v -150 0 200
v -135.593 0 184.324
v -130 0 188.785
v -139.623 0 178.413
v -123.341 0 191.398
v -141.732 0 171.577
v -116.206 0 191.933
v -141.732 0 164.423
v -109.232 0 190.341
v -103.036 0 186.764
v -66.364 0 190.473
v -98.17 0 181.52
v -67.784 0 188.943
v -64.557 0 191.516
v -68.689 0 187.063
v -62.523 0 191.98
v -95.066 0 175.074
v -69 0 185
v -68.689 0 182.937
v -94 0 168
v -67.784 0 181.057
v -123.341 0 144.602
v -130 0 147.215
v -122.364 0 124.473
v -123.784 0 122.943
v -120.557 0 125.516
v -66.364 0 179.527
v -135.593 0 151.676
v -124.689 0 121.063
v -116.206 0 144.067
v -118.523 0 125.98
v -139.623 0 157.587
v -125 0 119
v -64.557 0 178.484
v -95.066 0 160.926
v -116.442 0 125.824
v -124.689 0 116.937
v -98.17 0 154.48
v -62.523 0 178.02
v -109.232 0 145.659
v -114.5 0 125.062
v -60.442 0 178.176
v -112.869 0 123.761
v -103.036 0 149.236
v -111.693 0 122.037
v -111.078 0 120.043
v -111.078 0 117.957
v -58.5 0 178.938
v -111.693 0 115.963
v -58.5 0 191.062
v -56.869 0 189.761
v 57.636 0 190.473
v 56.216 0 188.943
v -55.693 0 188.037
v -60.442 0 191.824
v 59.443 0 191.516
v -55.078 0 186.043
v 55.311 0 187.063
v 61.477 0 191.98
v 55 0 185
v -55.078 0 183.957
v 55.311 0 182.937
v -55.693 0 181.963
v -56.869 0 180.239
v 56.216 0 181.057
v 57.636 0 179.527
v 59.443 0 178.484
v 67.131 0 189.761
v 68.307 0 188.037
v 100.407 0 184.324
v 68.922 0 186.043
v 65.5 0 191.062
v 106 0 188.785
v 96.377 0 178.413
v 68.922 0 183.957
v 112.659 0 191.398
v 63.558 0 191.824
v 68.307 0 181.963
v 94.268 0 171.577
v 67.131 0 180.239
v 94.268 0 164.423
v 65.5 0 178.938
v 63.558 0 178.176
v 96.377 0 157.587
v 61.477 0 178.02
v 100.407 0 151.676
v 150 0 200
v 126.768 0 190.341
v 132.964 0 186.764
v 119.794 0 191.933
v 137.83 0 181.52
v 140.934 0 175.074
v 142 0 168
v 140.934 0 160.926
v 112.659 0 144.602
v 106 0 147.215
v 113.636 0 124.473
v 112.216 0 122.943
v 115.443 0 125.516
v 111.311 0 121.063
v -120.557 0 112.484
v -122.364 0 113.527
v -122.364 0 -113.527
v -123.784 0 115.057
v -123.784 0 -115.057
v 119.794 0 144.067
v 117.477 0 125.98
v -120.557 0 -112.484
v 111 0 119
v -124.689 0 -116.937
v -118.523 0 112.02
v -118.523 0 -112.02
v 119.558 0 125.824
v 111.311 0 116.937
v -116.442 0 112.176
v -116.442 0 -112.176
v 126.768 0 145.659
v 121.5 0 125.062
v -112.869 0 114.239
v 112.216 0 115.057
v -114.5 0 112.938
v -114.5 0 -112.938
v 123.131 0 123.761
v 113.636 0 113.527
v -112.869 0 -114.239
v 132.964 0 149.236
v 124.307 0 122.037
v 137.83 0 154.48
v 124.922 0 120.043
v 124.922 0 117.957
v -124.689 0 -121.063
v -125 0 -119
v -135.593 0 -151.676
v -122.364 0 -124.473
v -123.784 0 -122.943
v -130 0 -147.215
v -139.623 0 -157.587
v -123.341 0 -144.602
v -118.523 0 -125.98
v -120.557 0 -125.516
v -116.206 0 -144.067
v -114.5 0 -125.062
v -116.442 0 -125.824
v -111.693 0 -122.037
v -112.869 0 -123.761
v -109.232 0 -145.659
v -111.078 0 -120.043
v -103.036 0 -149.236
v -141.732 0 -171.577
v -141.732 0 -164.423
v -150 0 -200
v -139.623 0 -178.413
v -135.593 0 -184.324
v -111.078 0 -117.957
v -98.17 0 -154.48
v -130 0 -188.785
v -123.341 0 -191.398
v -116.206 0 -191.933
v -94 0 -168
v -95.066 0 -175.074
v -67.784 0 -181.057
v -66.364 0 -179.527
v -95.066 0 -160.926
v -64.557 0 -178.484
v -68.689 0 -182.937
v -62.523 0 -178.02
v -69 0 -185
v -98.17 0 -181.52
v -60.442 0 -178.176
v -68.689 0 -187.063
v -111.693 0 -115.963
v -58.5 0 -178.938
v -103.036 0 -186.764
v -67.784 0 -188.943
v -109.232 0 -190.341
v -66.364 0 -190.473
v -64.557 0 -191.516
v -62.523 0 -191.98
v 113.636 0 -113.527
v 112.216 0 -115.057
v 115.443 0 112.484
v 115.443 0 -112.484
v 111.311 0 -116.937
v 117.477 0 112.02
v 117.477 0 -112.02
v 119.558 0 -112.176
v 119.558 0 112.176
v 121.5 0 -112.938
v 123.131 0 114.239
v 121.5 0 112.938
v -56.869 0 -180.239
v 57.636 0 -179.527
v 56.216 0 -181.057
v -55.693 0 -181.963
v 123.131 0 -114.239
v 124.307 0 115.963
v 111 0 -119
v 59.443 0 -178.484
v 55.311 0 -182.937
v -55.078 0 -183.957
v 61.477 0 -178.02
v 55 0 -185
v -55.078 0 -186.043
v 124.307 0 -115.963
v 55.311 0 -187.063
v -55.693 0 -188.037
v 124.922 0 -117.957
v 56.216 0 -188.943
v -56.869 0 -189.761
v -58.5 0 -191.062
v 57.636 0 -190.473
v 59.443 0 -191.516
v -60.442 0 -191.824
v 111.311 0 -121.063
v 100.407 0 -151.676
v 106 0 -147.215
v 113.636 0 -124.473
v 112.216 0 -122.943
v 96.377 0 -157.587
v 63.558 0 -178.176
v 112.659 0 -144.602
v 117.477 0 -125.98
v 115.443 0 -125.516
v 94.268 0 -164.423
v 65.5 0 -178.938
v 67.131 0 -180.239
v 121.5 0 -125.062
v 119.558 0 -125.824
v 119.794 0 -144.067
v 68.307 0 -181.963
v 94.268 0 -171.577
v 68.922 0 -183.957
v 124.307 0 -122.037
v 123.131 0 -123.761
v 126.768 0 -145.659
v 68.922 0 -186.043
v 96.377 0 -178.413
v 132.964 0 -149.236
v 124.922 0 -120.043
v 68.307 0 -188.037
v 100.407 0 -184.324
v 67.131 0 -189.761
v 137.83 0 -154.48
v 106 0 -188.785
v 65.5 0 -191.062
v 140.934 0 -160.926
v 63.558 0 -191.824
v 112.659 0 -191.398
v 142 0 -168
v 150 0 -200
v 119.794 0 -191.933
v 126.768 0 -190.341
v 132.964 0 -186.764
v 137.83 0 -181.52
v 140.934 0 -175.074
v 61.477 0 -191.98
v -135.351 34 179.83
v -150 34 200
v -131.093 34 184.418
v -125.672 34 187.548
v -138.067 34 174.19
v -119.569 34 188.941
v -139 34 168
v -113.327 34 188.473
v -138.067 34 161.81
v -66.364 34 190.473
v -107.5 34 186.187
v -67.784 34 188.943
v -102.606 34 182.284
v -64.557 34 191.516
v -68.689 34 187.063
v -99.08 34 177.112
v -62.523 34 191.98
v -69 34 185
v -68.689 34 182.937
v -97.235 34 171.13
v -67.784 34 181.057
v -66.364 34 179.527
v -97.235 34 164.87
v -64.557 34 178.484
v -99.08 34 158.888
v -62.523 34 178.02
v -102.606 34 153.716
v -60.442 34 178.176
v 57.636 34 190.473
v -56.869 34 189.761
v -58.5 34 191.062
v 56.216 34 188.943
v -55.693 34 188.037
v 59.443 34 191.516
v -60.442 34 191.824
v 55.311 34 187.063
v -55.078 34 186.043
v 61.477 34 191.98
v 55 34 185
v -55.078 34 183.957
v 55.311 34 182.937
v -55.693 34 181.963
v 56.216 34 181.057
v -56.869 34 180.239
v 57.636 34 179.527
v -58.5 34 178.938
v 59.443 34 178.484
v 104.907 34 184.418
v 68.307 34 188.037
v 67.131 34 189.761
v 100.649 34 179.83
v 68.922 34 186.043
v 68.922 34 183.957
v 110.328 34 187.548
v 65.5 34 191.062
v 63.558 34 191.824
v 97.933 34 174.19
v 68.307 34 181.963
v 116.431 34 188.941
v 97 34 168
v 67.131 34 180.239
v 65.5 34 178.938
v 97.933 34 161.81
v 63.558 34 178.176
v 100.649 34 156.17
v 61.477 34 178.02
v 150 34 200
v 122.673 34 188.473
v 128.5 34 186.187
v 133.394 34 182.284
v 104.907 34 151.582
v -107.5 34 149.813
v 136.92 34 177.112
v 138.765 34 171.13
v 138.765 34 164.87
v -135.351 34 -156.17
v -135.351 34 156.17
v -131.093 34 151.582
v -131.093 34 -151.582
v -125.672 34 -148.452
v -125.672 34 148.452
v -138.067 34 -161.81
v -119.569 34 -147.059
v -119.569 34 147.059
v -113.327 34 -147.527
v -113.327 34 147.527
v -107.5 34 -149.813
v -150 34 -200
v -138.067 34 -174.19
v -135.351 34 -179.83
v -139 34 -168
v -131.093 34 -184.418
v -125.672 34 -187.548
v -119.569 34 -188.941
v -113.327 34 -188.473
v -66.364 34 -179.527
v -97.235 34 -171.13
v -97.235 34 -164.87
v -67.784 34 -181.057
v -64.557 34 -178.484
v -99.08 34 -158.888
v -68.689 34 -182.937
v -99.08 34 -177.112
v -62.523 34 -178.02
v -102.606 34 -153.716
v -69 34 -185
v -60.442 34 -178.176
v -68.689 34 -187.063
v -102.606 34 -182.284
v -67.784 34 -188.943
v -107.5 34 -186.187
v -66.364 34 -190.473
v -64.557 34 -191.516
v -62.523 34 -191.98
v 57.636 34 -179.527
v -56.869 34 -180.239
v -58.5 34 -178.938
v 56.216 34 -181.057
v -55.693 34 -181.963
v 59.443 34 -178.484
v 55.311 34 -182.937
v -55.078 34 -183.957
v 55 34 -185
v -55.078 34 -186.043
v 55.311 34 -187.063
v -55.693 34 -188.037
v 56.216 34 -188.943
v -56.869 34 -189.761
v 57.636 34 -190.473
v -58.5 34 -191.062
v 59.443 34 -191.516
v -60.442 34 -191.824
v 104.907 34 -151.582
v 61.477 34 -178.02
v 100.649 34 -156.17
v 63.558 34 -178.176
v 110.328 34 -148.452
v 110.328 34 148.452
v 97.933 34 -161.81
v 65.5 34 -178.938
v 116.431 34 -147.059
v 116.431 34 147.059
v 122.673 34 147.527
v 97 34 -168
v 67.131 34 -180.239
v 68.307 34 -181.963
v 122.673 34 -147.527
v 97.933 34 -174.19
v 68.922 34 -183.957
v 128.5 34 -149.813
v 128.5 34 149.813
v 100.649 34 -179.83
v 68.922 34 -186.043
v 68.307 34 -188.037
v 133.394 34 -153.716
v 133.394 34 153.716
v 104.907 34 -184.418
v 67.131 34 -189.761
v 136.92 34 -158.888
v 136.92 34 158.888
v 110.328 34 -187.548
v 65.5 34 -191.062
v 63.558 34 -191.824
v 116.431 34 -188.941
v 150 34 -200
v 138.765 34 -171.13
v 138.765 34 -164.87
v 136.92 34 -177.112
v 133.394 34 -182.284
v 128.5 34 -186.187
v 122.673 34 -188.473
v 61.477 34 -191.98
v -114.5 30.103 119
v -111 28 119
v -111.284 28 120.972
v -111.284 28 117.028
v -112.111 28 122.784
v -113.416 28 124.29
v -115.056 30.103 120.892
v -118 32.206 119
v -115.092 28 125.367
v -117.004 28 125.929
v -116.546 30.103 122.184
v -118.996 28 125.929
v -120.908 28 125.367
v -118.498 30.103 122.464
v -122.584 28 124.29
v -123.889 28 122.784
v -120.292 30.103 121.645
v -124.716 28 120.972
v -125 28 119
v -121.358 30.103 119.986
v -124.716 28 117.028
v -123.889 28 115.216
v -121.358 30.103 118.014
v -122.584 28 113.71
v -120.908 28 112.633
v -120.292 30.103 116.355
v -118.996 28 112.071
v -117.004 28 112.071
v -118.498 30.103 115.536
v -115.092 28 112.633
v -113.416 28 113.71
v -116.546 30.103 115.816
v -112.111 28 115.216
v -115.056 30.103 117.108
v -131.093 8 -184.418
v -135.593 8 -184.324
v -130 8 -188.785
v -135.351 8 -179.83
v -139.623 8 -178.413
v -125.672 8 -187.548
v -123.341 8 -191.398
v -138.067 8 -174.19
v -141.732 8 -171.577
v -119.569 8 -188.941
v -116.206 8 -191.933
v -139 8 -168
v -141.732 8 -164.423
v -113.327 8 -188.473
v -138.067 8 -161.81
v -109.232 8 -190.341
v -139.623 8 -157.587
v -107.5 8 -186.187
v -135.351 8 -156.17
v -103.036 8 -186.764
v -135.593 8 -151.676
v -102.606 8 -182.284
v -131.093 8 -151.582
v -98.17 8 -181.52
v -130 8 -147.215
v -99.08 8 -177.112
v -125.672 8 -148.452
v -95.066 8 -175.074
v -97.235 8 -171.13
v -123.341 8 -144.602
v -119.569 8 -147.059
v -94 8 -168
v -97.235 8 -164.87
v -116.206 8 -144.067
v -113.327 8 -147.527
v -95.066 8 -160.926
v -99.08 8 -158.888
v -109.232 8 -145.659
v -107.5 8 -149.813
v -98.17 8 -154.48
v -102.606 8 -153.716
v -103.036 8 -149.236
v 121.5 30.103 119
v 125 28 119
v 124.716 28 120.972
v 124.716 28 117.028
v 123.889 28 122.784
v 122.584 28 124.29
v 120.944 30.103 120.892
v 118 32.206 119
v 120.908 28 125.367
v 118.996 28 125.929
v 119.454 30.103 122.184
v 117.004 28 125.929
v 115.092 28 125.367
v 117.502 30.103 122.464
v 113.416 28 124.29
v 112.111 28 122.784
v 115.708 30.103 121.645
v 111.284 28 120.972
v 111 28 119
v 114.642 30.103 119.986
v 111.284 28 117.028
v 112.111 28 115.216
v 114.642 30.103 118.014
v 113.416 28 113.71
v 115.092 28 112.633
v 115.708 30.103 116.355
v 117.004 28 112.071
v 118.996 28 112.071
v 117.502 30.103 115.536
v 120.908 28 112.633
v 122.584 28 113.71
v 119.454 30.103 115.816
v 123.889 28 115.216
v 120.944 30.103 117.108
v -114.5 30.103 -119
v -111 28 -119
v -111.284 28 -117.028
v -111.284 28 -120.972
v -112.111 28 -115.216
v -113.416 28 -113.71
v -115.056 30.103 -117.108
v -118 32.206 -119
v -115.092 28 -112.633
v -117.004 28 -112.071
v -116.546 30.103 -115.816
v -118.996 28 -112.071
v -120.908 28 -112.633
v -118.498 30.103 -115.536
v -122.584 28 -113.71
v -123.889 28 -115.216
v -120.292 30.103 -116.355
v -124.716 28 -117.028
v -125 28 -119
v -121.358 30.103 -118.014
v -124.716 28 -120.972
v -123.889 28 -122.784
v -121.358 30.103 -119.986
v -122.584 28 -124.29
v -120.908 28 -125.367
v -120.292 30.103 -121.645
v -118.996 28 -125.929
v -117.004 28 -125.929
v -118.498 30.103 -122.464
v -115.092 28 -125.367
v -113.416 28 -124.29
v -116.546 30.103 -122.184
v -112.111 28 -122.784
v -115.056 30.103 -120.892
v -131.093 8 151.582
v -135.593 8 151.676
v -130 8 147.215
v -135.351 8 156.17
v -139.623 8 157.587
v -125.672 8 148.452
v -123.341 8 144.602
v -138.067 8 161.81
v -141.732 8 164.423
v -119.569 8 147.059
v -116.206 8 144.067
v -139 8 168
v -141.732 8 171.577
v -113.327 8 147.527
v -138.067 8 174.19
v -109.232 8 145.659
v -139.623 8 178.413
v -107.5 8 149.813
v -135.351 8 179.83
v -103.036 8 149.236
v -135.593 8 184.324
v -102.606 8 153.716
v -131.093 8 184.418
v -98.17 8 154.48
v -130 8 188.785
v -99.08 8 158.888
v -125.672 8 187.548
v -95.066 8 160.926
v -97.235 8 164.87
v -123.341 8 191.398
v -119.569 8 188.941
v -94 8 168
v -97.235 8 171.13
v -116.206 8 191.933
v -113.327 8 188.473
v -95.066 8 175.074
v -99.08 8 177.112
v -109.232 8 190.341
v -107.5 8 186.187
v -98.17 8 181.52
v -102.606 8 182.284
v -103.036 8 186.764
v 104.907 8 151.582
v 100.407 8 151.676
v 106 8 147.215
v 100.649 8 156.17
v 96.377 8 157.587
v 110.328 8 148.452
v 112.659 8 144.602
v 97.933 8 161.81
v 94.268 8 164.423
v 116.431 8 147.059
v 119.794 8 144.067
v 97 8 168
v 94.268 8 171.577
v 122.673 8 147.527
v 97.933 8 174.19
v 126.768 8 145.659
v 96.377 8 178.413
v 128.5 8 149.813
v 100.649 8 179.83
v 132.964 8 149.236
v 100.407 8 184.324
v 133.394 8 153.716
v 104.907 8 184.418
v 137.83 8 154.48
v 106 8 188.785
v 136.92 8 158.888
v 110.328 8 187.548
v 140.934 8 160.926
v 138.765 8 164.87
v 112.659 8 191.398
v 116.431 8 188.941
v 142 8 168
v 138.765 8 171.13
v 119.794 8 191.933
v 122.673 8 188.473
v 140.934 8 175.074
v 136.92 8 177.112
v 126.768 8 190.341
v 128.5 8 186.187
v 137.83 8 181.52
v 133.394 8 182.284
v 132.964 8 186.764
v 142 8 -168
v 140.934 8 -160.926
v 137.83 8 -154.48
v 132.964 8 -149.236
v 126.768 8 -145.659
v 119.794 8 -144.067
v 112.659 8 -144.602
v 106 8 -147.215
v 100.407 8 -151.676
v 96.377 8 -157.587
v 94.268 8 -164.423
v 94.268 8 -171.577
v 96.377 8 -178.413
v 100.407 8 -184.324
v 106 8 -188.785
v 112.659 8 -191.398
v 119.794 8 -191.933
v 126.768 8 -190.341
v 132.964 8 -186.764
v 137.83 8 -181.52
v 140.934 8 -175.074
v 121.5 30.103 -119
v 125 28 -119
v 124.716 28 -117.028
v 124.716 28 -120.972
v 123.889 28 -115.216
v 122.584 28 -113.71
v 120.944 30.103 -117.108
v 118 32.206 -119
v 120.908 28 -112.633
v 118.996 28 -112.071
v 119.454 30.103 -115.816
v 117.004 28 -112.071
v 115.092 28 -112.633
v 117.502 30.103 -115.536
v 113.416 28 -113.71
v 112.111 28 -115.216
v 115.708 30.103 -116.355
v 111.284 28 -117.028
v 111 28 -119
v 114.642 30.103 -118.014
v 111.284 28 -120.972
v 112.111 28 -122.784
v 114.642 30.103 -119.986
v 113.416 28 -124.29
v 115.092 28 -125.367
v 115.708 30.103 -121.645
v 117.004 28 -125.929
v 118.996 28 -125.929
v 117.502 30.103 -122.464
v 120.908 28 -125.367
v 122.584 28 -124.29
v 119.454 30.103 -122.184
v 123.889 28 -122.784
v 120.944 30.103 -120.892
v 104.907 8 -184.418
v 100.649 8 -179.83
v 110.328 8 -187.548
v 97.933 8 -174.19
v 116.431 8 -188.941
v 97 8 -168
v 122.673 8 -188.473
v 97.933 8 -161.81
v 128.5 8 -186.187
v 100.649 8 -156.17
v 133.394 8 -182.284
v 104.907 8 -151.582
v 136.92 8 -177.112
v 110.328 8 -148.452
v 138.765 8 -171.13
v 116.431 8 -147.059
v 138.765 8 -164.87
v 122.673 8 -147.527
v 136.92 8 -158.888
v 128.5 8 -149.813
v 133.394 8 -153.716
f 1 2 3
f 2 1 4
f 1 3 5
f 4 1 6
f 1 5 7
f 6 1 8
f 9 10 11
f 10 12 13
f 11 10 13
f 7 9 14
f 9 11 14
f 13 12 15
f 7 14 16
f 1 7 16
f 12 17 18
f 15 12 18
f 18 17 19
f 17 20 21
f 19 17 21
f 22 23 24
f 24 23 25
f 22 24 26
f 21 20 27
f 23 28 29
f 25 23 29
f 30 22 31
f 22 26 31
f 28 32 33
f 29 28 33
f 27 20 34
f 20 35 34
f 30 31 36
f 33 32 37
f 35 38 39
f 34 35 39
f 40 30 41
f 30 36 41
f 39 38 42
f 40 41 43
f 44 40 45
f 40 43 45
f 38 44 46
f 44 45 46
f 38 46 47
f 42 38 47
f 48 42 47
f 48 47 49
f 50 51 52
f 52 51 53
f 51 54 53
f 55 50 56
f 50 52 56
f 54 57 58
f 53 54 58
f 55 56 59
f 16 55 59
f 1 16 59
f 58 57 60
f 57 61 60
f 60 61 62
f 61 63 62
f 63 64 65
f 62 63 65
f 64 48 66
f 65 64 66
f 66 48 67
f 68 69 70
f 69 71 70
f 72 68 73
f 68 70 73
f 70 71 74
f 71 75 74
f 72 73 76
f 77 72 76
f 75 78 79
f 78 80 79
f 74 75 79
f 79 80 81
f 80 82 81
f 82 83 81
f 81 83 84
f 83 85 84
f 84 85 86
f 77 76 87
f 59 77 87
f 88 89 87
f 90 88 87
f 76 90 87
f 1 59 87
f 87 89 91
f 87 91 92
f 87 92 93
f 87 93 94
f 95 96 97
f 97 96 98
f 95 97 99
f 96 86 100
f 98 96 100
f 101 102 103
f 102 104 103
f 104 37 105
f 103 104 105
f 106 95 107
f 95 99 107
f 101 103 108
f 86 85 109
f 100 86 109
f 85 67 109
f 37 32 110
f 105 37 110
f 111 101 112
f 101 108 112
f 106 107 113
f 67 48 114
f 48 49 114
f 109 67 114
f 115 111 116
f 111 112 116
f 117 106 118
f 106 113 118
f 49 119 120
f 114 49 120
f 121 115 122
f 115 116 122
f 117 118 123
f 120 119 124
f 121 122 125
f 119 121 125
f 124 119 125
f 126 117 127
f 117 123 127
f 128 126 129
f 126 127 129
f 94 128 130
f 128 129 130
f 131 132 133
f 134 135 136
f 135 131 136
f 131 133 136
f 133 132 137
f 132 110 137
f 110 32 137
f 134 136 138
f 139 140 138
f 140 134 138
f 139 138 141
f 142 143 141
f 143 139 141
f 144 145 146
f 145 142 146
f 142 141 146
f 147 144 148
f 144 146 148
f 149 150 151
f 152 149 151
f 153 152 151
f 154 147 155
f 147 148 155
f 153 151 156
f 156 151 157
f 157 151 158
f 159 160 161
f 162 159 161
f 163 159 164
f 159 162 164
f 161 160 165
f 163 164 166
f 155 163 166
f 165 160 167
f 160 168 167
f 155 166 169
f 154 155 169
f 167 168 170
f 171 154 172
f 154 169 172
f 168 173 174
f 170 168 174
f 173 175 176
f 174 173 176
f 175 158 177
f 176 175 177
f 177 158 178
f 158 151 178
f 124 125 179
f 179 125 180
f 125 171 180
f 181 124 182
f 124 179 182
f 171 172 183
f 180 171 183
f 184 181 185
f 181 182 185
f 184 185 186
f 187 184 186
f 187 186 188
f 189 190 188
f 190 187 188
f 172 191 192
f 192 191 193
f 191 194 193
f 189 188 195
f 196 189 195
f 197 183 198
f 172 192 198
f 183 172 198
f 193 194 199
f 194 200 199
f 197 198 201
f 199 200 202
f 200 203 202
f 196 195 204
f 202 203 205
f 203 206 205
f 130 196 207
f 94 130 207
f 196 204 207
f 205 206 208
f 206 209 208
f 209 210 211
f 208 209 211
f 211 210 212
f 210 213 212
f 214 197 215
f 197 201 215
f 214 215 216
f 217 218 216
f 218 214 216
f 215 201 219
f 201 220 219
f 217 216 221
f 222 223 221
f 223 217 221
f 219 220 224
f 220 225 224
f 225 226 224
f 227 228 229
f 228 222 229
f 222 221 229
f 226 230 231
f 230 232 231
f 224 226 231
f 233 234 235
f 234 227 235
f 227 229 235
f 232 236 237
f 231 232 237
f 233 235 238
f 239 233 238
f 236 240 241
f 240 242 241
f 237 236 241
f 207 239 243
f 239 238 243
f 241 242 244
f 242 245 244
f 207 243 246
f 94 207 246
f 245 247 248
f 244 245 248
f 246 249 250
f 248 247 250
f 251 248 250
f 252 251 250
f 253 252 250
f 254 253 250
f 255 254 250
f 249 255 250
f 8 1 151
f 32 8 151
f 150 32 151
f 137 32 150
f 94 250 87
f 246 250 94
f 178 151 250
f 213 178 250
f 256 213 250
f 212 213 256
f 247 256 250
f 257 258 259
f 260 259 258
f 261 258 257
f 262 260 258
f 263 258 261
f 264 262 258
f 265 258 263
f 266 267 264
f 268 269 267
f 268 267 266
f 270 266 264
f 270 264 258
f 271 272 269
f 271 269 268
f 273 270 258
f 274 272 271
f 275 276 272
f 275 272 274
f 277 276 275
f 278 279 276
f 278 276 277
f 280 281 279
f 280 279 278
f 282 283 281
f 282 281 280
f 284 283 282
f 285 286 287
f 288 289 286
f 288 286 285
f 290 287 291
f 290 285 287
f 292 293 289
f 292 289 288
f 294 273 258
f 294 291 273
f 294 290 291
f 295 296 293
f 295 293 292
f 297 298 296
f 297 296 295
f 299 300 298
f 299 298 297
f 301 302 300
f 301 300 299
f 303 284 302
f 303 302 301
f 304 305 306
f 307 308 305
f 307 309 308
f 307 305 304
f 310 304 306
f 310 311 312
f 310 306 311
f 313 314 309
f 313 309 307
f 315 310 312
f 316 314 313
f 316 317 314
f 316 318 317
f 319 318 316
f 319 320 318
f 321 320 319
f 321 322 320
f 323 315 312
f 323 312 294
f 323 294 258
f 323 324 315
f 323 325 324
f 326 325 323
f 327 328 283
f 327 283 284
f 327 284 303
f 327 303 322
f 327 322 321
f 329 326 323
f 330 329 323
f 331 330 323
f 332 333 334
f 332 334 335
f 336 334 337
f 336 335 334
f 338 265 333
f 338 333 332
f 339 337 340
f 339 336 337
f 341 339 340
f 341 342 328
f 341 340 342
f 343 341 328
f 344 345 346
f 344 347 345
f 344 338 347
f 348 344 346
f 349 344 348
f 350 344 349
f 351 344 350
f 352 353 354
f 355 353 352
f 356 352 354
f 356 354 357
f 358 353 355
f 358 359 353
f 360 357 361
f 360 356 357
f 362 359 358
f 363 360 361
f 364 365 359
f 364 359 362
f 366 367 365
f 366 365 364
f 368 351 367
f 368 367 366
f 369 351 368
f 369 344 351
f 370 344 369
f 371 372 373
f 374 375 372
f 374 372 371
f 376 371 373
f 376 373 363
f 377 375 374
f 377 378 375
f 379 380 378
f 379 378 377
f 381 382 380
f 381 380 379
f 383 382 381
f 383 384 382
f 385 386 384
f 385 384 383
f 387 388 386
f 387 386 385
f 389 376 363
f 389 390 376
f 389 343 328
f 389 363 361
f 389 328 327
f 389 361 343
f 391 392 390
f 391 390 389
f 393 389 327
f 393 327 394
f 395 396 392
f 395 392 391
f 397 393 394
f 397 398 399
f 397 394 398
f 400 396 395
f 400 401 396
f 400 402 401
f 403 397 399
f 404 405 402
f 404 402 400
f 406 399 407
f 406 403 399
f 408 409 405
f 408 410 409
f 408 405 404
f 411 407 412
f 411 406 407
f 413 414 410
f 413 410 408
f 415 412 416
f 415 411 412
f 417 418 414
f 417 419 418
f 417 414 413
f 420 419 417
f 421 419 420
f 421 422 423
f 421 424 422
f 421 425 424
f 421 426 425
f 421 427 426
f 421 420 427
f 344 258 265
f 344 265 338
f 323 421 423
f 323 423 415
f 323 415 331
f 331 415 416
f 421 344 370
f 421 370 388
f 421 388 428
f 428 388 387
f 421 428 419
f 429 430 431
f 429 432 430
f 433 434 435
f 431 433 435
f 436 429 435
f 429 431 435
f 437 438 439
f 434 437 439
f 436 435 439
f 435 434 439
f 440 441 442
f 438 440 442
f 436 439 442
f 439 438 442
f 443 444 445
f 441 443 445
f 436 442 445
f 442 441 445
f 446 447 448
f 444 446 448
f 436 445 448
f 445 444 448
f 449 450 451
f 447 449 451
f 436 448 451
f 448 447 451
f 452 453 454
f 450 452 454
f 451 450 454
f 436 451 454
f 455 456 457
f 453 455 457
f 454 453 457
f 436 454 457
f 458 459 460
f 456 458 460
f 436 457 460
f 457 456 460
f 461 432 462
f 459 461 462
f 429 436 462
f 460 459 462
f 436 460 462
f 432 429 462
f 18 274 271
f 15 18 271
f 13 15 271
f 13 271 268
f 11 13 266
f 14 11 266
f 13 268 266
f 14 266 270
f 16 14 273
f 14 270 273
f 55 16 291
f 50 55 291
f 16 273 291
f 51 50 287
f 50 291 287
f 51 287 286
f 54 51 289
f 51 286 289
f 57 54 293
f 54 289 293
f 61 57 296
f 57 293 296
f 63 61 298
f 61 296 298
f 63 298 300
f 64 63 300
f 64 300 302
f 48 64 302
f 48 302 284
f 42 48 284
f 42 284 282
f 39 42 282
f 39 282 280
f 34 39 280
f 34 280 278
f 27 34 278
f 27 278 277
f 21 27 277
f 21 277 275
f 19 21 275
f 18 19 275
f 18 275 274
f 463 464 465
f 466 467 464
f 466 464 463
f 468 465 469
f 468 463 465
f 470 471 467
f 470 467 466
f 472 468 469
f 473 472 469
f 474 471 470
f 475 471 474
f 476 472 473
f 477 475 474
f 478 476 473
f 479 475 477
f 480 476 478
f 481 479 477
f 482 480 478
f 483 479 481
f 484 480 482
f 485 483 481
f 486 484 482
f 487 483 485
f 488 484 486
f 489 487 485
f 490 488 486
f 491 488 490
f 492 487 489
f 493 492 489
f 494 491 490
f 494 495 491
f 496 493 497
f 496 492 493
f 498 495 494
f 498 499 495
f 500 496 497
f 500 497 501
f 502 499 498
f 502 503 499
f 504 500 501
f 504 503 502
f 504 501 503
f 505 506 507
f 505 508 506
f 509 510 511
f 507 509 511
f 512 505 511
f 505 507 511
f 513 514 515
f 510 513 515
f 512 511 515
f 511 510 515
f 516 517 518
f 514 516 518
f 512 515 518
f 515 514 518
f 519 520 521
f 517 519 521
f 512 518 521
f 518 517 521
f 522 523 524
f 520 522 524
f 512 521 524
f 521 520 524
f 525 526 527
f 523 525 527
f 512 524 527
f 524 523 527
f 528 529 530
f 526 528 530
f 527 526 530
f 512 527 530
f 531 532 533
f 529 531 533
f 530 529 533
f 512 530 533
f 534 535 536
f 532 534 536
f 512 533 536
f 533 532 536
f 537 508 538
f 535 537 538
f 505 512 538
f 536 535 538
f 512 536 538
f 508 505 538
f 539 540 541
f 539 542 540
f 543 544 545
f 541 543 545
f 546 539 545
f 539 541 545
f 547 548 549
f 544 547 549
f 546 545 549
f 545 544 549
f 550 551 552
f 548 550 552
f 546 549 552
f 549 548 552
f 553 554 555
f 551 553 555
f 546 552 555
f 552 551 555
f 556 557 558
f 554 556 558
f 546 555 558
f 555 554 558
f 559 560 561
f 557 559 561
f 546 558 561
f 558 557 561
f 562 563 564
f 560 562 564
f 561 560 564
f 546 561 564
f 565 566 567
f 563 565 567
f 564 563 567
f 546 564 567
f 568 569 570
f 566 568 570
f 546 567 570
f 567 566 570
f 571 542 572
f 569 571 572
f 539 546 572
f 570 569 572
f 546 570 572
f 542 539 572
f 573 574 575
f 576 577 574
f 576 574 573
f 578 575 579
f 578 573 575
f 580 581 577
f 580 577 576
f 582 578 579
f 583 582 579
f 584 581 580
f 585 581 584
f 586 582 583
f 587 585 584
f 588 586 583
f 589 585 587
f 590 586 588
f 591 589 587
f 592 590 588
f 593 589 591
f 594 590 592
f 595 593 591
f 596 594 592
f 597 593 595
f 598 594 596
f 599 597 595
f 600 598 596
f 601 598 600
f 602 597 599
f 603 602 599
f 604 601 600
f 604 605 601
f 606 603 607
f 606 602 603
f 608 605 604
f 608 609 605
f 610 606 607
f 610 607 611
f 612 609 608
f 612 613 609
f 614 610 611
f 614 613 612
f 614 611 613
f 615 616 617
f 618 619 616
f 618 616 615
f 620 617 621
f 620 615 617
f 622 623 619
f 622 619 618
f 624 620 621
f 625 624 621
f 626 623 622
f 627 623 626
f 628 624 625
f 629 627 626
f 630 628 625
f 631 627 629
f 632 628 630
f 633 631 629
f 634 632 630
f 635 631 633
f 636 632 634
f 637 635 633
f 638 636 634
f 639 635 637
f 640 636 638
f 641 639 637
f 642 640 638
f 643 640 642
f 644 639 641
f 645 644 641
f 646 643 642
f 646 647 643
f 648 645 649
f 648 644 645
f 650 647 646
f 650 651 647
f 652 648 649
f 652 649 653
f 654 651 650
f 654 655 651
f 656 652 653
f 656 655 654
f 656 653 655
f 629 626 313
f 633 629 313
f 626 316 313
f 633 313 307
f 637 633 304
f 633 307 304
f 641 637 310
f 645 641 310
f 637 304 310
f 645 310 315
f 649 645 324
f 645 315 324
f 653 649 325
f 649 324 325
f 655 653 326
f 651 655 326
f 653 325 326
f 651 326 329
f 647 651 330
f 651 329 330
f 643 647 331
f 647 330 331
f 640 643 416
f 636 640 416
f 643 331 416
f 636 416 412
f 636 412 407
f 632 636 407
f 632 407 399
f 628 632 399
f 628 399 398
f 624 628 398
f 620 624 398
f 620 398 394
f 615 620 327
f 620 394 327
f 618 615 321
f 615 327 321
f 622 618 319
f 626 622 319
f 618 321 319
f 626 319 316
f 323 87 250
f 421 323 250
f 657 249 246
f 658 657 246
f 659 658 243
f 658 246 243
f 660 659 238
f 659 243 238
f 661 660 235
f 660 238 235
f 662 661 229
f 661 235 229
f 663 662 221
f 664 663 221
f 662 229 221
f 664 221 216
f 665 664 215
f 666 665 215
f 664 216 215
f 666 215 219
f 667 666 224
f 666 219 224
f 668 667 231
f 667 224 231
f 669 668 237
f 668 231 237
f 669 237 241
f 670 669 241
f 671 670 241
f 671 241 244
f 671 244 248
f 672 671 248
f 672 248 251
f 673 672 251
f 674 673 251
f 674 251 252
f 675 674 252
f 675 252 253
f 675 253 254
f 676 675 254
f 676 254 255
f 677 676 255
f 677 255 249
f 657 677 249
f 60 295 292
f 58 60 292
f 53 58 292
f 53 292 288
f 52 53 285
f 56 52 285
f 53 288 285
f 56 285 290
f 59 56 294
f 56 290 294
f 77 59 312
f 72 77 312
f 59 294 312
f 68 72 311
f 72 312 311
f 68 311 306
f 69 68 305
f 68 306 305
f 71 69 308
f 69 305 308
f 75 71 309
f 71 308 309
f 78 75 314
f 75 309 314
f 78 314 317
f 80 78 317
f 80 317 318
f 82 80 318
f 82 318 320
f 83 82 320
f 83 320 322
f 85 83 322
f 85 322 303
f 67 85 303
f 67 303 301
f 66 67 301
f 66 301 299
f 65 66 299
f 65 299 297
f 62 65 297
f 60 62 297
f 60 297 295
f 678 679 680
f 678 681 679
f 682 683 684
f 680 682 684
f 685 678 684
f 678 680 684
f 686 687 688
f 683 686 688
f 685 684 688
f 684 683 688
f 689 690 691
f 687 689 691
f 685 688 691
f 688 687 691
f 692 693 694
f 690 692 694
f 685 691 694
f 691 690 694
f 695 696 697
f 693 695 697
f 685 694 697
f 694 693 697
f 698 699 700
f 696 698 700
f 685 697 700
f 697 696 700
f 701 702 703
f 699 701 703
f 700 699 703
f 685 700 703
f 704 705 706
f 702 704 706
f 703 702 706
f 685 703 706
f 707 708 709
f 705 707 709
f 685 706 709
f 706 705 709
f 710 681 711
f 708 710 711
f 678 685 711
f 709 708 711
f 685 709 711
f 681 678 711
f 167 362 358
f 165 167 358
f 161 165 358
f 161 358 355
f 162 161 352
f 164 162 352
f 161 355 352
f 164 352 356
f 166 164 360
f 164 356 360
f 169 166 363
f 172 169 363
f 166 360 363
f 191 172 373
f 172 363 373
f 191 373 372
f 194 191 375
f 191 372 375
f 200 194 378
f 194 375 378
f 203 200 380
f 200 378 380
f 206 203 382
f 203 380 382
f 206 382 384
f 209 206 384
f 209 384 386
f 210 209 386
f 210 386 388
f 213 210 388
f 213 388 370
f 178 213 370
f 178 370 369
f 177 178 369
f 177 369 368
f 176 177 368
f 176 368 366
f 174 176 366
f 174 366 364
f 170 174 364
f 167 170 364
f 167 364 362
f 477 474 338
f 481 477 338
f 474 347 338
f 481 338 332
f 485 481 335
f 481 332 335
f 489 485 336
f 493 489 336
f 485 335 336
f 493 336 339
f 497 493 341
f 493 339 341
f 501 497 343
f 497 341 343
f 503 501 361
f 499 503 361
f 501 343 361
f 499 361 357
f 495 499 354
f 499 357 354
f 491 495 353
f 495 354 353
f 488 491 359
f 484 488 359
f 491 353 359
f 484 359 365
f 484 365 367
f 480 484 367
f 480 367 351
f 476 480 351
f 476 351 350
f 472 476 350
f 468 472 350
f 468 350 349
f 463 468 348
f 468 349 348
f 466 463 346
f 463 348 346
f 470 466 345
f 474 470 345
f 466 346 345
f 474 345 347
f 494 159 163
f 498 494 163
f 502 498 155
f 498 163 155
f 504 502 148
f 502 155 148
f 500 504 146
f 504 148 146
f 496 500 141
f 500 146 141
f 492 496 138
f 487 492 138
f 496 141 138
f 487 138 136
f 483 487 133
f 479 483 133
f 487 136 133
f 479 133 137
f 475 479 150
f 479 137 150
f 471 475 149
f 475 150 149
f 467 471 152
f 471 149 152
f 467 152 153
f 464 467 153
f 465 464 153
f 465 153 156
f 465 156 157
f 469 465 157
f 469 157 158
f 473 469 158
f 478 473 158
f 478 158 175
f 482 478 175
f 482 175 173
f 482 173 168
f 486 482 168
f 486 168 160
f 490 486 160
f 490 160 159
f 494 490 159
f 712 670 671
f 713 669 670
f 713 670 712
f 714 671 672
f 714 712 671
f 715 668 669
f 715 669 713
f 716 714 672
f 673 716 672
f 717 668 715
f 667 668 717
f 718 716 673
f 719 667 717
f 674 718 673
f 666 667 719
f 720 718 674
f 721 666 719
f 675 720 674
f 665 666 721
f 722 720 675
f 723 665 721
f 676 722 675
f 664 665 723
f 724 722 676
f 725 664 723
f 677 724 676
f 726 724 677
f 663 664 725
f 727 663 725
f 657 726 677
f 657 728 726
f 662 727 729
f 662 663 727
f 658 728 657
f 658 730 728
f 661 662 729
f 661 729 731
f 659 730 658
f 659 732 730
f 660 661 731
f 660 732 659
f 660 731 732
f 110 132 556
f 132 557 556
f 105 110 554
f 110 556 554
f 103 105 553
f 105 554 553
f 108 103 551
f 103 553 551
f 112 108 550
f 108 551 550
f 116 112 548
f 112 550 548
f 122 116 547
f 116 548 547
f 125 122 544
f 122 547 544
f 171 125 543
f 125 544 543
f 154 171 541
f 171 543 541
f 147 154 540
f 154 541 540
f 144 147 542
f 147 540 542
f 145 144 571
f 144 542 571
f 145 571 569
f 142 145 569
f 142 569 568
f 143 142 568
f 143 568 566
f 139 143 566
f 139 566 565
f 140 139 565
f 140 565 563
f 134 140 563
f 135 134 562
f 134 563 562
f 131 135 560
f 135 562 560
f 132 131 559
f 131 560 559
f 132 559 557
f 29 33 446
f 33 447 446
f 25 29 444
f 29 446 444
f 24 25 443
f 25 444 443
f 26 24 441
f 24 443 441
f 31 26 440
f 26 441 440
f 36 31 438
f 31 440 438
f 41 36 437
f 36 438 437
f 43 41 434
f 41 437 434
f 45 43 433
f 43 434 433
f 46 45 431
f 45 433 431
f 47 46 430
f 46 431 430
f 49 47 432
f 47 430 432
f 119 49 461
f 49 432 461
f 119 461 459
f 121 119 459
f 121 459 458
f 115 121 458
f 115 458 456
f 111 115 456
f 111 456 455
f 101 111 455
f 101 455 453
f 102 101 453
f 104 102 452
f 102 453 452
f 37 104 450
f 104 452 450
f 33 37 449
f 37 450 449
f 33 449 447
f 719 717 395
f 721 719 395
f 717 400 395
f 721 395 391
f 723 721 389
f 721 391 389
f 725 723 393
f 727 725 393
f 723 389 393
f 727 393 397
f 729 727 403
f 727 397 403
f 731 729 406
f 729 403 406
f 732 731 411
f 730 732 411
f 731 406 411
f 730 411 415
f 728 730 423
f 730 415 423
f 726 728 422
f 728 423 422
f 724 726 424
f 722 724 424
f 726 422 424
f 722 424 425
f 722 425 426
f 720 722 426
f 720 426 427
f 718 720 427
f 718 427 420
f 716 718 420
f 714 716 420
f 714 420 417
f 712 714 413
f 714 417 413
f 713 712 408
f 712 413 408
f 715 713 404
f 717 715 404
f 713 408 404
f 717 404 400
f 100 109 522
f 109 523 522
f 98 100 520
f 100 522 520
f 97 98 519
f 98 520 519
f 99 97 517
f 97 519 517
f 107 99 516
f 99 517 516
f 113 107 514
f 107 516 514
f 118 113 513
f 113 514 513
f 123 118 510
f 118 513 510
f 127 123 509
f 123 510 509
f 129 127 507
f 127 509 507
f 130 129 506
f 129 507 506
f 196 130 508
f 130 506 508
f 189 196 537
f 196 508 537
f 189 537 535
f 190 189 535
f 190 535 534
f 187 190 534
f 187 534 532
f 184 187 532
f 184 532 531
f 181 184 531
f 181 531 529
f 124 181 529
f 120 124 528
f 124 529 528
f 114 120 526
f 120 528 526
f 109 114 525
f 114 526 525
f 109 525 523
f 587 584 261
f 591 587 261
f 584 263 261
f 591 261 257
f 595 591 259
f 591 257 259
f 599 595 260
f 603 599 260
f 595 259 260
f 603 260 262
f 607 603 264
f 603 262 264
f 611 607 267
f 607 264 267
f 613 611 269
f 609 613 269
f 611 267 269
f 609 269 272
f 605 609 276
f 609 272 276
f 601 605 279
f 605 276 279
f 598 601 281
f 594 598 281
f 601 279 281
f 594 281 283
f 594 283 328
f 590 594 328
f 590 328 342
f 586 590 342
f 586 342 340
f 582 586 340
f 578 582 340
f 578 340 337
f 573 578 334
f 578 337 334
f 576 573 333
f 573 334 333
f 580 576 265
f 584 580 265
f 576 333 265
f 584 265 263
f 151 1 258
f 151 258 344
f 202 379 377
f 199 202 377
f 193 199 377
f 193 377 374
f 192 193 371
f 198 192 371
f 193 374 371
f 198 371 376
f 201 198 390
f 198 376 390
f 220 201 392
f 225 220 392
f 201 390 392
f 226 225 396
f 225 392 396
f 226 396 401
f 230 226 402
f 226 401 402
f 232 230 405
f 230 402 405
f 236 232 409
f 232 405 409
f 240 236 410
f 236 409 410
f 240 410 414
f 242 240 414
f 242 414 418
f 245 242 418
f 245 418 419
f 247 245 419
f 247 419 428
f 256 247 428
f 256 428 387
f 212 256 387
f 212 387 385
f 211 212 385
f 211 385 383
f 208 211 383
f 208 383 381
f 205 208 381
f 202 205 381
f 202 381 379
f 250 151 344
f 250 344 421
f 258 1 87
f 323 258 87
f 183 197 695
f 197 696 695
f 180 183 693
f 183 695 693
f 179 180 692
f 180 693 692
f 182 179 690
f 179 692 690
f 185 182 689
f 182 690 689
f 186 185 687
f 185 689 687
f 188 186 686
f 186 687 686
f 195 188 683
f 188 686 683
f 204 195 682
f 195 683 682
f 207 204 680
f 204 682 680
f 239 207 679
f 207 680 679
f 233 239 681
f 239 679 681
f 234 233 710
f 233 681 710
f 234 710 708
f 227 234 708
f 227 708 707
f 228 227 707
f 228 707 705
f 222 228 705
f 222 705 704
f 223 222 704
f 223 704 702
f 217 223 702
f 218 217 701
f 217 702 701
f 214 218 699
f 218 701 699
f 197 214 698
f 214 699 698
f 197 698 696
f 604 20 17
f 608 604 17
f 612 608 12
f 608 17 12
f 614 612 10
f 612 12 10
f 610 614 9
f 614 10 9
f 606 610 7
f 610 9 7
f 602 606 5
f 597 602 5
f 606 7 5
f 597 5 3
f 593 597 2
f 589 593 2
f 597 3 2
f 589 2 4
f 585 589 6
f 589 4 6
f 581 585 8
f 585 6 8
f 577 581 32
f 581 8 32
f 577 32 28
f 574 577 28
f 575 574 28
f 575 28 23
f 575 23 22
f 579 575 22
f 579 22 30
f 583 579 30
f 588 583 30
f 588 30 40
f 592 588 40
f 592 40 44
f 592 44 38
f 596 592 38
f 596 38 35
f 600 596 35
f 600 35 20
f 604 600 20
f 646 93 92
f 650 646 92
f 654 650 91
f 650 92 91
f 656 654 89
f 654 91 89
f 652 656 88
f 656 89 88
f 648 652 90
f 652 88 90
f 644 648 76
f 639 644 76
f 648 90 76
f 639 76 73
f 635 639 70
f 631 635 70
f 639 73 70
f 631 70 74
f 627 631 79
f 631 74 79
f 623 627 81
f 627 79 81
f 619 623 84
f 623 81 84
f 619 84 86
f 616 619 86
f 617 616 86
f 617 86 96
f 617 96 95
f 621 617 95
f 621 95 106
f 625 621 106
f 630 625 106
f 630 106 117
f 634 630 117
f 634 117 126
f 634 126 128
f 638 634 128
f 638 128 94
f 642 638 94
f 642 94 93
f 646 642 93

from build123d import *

# Parameters (mm, degrees)
ESBO_O1_W                  = 300
ESBO_O1_H                  = 400
EXTRUS_O1_DEPTH            = 34
FURO_ROSCADO_DE_M161_D     = 14
FURO_ROSCADO_DE_M161_DEPTH = 28
FURO_ROSCADO_DE_M161_TIP   = 4.206024333
FURO1_D                    = 42
FURO1_CBORE_D              = 48
FURO1_CBORE_DEPTH          = 8
FURO2_D                    = 14
FURO2_DEPTH                = 100


with BuildPart() as part:
    # Esboço1 → Extrusão1 (new body)
    with BuildSketch(Plane(origin=(0, 0, 0), x_dir=(1, 0, 0), z_dir=(0, 1, 0))):
        Rectangle(ESBO_O1_W, ESBO_O1_H)
    extrude(amount=EXTRUS_O1_DEPTH)

    # Furo roscado de M161
    with Locations(Plane.XZ):
        with Locations((-118, 119), (118, 119), (-118, -119), (118, -119)):
            Hole(FURO_ROSCADO_DE_M161_D / 2, depth=FURO_ROSCADO_DE_M161_DEPTH)
            with Locations((0, 0, -(FURO_ROSCADO_DE_M161_DEPTH + FURO_ROSCADO_DE_M161_TIP / 2))):  # 118° drill point
                Cone(0, FURO_ROSCADO_DE_M161_D / 2, FURO_ROSCADO_DE_M161_TIP, mode=Mode.SUBTRACT)

    # Furo1 (through all)
    with Locations(Plane.XZ):
        with Locations((118, 168), (118, -168), (-118, -168), (-118, 168)):
            CounterBoreHole(FURO1_D / 2, FURO1_CBORE_D / 2, FURO1_CBORE_DEPTH)

    # Furo2
    with Locations(Plane.XZ):
        with Locations((-62, 185), (-62, -185), (62, 185), (62, -185)):
            Hole(FURO2_D / 2, depth=FURO2_DEPTH)


solid = part.part
